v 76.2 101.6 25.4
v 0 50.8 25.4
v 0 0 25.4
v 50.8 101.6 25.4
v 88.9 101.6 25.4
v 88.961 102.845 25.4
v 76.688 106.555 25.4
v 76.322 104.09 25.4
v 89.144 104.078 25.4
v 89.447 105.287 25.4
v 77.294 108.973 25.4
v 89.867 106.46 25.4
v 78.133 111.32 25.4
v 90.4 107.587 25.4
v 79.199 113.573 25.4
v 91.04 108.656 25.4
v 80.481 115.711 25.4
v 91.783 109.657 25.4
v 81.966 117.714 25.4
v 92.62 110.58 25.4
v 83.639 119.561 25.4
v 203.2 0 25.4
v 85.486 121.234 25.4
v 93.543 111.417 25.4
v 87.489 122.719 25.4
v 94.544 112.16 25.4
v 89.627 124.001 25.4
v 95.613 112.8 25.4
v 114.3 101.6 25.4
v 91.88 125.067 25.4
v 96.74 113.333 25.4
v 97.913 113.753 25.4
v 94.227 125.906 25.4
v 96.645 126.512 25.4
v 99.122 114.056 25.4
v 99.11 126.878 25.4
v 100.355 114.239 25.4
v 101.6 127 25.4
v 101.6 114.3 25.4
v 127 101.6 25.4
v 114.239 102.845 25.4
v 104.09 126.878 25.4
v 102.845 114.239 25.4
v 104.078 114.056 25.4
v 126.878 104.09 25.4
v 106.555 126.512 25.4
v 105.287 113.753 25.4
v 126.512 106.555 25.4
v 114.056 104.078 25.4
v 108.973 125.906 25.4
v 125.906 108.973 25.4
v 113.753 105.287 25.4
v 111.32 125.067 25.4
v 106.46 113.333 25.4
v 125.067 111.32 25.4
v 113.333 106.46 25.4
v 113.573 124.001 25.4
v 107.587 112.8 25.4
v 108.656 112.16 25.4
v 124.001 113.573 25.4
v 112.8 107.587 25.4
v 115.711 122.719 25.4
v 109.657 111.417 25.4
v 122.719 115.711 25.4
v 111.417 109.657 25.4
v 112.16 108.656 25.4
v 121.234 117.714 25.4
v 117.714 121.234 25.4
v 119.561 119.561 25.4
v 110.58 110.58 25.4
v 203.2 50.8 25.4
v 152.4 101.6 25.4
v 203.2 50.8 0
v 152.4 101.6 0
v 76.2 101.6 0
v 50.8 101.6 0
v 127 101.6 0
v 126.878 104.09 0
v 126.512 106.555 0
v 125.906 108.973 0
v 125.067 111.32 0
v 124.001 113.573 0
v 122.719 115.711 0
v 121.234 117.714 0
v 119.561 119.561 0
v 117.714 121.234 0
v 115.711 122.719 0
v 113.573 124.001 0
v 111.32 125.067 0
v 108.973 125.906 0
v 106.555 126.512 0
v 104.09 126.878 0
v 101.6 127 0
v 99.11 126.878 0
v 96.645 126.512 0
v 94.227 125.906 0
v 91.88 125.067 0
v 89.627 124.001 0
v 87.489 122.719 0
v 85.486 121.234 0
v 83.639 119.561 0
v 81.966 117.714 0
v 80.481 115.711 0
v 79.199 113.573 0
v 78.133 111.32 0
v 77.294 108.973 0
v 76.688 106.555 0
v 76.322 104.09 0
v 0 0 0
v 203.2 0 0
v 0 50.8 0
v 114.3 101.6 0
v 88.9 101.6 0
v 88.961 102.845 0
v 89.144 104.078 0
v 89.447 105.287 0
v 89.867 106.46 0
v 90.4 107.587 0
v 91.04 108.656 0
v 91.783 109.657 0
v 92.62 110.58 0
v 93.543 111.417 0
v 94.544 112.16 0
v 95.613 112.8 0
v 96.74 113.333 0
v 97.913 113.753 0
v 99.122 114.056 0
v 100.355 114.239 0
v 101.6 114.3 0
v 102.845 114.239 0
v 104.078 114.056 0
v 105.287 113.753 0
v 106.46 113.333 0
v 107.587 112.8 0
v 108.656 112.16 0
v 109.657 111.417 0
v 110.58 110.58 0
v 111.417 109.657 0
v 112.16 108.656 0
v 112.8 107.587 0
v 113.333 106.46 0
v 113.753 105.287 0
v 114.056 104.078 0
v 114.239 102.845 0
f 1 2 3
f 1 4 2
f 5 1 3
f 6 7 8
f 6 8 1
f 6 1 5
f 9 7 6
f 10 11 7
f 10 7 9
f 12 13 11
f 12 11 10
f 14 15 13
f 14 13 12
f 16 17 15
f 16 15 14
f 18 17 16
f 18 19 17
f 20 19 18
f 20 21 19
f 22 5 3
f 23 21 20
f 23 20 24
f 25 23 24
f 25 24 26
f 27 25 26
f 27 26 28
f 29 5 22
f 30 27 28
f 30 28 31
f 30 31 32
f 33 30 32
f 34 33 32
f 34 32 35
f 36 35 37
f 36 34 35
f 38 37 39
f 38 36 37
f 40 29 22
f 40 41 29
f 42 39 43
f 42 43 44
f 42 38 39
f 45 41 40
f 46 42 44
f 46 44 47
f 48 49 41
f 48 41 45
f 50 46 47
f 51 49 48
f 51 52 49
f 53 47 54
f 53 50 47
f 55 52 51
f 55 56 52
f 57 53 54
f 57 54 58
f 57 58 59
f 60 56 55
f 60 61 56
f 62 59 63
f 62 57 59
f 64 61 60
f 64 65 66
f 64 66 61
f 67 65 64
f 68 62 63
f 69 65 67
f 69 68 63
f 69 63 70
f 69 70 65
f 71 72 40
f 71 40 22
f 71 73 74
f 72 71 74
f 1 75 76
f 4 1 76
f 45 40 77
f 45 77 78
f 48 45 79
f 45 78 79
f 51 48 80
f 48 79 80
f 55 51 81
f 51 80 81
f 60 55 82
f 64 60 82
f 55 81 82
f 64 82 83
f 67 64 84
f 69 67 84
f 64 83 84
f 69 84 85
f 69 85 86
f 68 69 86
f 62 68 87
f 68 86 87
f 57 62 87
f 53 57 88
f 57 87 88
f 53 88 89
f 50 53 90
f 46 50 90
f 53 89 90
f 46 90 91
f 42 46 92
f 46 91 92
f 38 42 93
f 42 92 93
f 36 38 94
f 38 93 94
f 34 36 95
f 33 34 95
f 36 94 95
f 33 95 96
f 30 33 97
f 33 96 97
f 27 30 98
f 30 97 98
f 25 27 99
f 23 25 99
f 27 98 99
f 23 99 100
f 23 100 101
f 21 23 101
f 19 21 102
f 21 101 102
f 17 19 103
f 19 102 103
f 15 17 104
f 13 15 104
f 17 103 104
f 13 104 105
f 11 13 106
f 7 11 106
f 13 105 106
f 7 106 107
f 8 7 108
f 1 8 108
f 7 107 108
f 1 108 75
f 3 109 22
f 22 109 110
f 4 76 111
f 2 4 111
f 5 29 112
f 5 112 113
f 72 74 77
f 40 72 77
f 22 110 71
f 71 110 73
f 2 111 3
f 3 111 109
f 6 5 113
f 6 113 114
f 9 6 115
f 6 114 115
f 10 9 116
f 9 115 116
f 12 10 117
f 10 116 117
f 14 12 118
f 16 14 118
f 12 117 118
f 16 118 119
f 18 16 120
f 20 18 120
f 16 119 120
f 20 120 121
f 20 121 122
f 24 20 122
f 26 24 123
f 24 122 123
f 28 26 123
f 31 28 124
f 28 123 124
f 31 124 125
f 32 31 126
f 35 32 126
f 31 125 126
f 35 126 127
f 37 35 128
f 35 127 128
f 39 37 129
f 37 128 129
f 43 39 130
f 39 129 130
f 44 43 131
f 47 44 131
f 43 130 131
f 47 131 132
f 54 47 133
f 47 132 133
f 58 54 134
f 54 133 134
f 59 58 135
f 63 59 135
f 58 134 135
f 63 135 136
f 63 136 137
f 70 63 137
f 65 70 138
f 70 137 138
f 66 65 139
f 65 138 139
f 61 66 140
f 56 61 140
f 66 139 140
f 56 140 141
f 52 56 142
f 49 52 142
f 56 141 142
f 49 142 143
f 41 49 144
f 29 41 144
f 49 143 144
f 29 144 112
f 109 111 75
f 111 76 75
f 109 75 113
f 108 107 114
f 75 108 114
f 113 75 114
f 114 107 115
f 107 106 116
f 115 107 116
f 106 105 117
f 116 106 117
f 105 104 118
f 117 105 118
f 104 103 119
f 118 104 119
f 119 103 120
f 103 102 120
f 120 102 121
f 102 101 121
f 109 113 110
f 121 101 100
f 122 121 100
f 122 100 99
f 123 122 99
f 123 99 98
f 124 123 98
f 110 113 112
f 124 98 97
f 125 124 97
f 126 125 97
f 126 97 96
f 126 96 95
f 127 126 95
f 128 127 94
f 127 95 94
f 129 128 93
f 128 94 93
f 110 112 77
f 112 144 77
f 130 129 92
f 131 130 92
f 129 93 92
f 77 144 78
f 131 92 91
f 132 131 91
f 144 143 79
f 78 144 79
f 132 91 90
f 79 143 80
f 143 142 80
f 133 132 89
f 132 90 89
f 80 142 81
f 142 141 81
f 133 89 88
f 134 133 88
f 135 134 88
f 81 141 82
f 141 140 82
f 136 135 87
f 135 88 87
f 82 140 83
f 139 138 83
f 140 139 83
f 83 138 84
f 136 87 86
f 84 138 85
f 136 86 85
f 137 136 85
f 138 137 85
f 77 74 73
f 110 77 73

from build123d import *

# Parameters (mm, degrees)
F1_DEPTH = 25.4


with BuildPart() as f1:
    # F0 (on Top) → F1 (new body)
    with BuildSketch(Plane.XY):
        with BuildLine():
            Line((0, 50.8), (0, 0))
            Line((0, 0), (203.2, 0))
            Line((203.2, 0), (203.2, 50.8))
            Line((203.2, 50.8), (152.4, 101.6))
            Line((152.4, 101.6), (127, 101.6))
            ThreePointArc((127, 101.6), (101.6, 127), (76.2, 101.6))
            Line((76.2, 101.6), (50.8, 101.6))
            Line((50.8, 101.6), (0, 50.8))
        make_face()
        with BuildLine():
            ThreePointArc((88.9, 101.6), (101.6, 114.3), (114.3, 101.6))
            Line((114.3, 101.6), (88.9, 101.6))
        make_face(mode=Mode.SUBTRACT)
    extrude(amount=F1_DEPTH)


solid = f1.part
